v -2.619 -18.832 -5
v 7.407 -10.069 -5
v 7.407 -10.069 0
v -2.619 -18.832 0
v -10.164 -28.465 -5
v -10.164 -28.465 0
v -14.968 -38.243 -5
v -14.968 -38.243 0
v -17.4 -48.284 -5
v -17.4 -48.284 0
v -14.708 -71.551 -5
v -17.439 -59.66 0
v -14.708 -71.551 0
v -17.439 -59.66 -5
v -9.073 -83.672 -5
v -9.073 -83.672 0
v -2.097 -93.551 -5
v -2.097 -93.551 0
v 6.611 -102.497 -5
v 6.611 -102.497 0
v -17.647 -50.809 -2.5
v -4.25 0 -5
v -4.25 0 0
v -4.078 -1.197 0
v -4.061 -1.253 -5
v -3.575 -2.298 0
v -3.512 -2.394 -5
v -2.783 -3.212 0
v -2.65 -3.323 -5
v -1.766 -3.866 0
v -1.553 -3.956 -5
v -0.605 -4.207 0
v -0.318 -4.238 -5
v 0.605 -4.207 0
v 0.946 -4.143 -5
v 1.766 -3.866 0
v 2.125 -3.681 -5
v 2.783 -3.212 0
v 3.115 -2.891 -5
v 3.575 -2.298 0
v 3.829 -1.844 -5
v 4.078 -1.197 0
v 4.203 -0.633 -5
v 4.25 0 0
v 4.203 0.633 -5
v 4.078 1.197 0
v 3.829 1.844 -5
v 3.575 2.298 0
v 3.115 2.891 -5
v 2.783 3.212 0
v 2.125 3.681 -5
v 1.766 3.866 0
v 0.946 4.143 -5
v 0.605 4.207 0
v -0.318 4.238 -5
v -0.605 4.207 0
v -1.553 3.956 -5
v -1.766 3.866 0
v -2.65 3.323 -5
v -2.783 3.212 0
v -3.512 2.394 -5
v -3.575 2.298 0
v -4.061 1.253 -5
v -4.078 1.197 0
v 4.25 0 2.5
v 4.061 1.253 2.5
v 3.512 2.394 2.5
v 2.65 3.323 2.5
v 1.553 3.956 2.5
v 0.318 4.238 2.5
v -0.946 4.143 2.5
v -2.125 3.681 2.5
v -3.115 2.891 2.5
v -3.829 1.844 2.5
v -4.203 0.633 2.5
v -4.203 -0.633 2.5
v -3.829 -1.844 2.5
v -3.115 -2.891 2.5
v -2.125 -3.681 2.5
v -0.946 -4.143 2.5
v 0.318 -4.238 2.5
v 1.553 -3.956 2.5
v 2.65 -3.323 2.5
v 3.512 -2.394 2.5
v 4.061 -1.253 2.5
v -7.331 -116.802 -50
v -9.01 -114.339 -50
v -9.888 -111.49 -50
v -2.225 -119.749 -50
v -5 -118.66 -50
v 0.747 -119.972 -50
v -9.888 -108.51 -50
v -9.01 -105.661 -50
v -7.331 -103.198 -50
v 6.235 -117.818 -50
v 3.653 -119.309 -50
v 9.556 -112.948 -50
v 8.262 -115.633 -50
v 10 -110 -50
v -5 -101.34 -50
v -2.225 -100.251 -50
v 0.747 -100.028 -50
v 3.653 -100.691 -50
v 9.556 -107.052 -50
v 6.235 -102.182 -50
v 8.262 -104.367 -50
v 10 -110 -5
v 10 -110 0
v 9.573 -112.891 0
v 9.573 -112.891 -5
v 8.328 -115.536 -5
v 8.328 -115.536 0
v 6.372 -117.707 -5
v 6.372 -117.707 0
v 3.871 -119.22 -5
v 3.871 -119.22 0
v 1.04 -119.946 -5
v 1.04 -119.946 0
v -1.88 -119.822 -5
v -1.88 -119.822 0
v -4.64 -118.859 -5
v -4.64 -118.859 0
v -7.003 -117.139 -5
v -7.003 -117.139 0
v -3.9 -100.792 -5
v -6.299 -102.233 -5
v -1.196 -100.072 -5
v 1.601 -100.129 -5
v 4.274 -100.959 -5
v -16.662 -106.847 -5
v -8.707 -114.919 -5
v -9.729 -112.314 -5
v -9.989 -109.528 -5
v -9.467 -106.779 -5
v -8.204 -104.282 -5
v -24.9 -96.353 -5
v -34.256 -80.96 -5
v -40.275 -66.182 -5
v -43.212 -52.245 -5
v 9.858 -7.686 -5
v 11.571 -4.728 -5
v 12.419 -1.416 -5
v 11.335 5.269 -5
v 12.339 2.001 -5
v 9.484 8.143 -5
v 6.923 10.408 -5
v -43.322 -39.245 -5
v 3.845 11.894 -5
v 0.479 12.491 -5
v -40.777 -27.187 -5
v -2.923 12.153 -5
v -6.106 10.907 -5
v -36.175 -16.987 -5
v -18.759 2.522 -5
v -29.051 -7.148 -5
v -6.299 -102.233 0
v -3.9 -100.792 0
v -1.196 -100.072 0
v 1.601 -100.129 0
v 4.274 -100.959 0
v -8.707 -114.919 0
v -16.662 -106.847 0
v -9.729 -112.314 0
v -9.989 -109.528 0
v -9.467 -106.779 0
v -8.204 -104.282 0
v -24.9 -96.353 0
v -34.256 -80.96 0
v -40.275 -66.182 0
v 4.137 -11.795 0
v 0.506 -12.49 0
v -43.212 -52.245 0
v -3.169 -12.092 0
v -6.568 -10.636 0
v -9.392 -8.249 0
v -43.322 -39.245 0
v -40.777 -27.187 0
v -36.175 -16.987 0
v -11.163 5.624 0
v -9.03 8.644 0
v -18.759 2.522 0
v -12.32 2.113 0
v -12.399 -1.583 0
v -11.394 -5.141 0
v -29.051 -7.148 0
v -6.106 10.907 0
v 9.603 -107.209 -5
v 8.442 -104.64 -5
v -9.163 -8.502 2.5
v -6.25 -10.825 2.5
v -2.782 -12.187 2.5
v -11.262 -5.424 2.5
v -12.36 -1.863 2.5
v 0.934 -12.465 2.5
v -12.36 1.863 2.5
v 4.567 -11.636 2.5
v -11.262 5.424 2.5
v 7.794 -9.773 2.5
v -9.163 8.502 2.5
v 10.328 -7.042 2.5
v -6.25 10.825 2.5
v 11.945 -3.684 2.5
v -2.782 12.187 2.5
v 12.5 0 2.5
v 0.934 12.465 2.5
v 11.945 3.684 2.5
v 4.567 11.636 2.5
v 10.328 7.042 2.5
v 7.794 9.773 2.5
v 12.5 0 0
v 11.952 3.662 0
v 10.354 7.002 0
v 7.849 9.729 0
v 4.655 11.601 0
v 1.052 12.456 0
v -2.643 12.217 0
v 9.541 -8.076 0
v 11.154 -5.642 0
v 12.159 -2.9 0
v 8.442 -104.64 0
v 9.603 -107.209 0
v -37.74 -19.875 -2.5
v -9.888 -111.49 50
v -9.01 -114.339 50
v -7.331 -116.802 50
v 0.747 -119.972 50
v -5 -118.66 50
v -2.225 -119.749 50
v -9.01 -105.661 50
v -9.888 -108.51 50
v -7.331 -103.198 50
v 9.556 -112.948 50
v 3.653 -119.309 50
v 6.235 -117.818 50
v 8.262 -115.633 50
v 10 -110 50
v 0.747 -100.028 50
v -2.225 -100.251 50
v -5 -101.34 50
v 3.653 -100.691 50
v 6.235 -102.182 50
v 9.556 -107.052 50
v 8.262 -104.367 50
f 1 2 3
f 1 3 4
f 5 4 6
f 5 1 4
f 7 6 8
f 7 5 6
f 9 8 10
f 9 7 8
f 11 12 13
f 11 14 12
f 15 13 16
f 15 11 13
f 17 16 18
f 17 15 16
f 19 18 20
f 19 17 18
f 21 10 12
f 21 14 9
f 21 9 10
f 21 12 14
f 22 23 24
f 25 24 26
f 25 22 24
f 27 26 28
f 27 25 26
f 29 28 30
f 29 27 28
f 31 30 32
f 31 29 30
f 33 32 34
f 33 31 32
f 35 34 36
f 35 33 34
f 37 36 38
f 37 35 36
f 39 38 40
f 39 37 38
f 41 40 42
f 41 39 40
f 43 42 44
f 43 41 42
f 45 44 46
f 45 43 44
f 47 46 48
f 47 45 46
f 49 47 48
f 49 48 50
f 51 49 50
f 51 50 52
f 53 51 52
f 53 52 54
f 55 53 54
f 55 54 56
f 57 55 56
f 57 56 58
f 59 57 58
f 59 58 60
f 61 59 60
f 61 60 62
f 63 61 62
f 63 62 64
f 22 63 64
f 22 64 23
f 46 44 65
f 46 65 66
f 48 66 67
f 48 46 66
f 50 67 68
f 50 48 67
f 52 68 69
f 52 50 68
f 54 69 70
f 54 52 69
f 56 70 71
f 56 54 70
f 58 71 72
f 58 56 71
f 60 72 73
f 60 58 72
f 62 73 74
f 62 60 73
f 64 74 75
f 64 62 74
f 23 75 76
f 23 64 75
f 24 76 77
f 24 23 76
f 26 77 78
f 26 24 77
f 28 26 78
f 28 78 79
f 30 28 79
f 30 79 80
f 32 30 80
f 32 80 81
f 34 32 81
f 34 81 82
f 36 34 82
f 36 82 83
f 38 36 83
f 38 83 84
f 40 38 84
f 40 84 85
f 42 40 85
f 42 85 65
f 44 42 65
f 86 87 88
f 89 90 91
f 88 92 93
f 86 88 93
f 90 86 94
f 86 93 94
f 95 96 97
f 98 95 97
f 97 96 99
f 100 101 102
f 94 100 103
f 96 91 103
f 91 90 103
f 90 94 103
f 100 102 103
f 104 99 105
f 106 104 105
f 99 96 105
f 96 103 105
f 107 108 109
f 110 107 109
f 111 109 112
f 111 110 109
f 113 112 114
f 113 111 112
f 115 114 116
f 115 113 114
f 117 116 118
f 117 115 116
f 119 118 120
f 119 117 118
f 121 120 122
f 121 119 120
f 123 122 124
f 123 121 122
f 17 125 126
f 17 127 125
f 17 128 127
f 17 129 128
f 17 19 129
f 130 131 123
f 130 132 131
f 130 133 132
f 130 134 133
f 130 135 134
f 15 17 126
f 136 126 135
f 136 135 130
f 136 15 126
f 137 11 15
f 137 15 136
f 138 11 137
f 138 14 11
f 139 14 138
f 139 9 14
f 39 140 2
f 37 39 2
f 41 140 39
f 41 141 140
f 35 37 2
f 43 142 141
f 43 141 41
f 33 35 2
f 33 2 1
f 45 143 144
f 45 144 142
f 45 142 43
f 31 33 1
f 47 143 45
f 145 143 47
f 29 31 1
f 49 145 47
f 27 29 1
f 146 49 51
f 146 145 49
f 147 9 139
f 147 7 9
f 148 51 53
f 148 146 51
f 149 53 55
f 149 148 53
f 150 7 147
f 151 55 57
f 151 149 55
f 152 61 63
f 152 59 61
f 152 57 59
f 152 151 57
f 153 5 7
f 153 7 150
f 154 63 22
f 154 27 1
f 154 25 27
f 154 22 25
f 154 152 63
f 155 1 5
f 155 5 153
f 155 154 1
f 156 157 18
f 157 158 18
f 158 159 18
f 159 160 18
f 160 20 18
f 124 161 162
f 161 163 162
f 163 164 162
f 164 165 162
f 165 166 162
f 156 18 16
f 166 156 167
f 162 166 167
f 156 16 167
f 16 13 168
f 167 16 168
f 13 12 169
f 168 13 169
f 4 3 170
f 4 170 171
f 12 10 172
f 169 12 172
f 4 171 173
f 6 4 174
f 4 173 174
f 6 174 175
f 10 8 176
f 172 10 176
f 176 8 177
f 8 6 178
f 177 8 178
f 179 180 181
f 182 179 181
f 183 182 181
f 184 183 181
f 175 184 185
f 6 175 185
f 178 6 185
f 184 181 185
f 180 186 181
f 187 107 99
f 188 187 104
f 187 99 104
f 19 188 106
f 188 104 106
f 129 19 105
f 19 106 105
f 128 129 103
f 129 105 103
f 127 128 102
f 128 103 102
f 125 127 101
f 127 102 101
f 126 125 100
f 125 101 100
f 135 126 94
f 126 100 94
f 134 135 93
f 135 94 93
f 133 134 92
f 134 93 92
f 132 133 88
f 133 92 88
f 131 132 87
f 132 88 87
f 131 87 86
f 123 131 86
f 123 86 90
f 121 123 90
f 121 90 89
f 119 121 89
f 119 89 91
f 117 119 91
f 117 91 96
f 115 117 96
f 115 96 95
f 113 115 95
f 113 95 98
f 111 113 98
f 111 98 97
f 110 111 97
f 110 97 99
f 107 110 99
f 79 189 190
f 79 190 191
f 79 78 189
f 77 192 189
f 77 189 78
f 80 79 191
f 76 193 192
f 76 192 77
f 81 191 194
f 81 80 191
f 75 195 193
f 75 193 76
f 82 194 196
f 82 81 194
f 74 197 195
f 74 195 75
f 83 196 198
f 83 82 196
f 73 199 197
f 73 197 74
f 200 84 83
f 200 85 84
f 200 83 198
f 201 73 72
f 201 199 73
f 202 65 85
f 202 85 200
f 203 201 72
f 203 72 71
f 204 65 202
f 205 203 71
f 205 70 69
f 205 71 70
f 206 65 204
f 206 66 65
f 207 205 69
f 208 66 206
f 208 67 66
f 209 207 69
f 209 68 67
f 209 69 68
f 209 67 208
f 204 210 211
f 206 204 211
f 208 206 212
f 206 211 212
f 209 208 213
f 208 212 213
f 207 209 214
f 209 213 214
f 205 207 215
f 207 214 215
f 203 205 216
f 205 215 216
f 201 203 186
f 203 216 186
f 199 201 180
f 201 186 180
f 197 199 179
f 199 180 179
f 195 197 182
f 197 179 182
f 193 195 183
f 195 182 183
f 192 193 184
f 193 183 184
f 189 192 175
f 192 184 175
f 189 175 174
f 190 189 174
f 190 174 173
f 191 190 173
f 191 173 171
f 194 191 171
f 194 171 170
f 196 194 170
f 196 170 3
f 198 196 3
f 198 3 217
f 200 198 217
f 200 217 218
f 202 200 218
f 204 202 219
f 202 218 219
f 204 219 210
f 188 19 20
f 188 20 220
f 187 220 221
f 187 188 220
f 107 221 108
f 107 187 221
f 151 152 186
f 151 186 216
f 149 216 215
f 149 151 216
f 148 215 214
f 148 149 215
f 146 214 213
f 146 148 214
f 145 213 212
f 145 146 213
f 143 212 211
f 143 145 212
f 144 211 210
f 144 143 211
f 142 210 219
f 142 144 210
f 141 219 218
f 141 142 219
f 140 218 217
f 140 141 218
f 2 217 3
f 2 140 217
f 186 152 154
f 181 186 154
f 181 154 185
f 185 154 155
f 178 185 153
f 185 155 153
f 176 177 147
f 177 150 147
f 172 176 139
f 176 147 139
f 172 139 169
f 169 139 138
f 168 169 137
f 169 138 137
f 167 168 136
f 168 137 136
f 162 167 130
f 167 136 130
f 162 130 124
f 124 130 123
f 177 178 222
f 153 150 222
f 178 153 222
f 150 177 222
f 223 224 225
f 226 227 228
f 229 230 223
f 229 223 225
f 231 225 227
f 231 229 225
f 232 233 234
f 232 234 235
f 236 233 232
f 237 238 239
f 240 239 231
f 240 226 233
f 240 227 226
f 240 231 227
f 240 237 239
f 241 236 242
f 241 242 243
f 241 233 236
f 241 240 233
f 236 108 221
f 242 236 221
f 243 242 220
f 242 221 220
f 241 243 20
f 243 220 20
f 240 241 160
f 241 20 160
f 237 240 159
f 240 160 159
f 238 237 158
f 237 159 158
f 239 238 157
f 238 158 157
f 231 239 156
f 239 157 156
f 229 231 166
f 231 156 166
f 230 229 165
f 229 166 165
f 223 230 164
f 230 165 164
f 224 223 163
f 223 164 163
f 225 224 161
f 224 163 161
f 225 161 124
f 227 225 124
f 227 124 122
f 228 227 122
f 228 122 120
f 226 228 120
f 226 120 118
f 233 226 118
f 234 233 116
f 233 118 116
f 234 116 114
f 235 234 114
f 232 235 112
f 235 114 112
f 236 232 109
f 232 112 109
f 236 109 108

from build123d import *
from build123d.topology import SkipClean

# Parameters (mm, degrees)
SKETCH1_R                = 12.5
SKETCH1_R_2              = 4.25
BOSS_EXTRUDE1_DEPTH      = 2.5
BOSS_EXTRUDE2_START      = 5
BOSS_EXTRUDE2_DEPTH      = 5
BOSS_EXTRUDE3_DEPTH      = 50
BOSS_EXTRUDE3_DEPTH_BACK = 50
SKETCH3_R                = 10
CUT_EXTRUDE1_START       = -40
SKETCH4_R                = 4.25
CUT_EXTRUDE1_DEPTH       = 40


with BuildPart() as part:
    # Sketch1 → Boss-Extrude1 (new body)
    with BuildSketch(Plane.XY):
        Circle(SKETCH1_R)
        Circle(SKETCH1_R_2, mode=Mode.SUBTRACT)
    extrude(amount=BOSS_EXTRUDE1_DEPTH)

    # Sketch2 → Boss-Extrude2 (add)
    with SkipClean():  # the faces are left unmerged after this step: merging them gives an invalid solid
        with BuildSketch(Plane(origin=(0, 0, 0), x_dir=(-1, 0, 0), z_dir=(0, 0, -1)).offset(BOSS_EXTRUDE2_START)):
            with BuildLine():
                ThreePointArc((-6.611094261, -102.497105047), (-7.323414251, -116.809376161), (7.00278738, -117.138695182))
                add(Edge.make_bspline(
                    [(6.106396375, 10.906966733), (20.621715475, 2.78039093), (57.030134585, -32.014511607), (40.003016754, -84.766730291), (7.00278738, -117.138695182)],
                    knots=[0, 0, 0, 0, 0.30202419, 1, 1, 1, 1], degree=3))
                ThreePointArc((6.106396375, 10.906966733), (-10.50822507, 6.769579446), (-7.406819033, -10.069212075))
                add(Edge.make_bspline(
                    [(-7.406819033, -10.069212075), (7.979907505, -21.387545439), (26.855730435, -52.646283336), (9.439793984, -88.354039493), (-6.611094261, -102.497105047)],
                    knots=[0, 0, 0, 0, 0.455821989, 1, 1, 1, 1], degree=3))
            make_face()
        extrude(amount=-BOSS_EXTRUDE2_DEPTH)

    # Sketch3 → Boss-Extrude3 (add, two sides: drawn at the far end of the back side and taken through both)
    with SkipClean():  # the faces are left unmerged after this step: merging them gives an invalid solid
        with BuildSketch(Plane.XY.offset(-BOSS_EXTRUDE3_DEPTH_BACK)):
            with Locations((0, -110)):
                Circle(SKETCH3_R)
        extrude(amount=BOSS_EXTRUDE3_DEPTH + BOSS_EXTRUDE3_DEPTH_BACK)

    # Sketch4 → Cut-Extrude1 (cut)
    with SkipClean():  # the faces are left unmerged after this step: merging them gives an invalid solid
        with BuildSketch(Plane.XY.offset(CUT_EXTRUDE1_START)):
            Circle(SKETCH4_R)
        extrude(amount=CUT_EXTRUDE1_DEPTH, mode=Mode.SUBTRACT)


solid = part.part
